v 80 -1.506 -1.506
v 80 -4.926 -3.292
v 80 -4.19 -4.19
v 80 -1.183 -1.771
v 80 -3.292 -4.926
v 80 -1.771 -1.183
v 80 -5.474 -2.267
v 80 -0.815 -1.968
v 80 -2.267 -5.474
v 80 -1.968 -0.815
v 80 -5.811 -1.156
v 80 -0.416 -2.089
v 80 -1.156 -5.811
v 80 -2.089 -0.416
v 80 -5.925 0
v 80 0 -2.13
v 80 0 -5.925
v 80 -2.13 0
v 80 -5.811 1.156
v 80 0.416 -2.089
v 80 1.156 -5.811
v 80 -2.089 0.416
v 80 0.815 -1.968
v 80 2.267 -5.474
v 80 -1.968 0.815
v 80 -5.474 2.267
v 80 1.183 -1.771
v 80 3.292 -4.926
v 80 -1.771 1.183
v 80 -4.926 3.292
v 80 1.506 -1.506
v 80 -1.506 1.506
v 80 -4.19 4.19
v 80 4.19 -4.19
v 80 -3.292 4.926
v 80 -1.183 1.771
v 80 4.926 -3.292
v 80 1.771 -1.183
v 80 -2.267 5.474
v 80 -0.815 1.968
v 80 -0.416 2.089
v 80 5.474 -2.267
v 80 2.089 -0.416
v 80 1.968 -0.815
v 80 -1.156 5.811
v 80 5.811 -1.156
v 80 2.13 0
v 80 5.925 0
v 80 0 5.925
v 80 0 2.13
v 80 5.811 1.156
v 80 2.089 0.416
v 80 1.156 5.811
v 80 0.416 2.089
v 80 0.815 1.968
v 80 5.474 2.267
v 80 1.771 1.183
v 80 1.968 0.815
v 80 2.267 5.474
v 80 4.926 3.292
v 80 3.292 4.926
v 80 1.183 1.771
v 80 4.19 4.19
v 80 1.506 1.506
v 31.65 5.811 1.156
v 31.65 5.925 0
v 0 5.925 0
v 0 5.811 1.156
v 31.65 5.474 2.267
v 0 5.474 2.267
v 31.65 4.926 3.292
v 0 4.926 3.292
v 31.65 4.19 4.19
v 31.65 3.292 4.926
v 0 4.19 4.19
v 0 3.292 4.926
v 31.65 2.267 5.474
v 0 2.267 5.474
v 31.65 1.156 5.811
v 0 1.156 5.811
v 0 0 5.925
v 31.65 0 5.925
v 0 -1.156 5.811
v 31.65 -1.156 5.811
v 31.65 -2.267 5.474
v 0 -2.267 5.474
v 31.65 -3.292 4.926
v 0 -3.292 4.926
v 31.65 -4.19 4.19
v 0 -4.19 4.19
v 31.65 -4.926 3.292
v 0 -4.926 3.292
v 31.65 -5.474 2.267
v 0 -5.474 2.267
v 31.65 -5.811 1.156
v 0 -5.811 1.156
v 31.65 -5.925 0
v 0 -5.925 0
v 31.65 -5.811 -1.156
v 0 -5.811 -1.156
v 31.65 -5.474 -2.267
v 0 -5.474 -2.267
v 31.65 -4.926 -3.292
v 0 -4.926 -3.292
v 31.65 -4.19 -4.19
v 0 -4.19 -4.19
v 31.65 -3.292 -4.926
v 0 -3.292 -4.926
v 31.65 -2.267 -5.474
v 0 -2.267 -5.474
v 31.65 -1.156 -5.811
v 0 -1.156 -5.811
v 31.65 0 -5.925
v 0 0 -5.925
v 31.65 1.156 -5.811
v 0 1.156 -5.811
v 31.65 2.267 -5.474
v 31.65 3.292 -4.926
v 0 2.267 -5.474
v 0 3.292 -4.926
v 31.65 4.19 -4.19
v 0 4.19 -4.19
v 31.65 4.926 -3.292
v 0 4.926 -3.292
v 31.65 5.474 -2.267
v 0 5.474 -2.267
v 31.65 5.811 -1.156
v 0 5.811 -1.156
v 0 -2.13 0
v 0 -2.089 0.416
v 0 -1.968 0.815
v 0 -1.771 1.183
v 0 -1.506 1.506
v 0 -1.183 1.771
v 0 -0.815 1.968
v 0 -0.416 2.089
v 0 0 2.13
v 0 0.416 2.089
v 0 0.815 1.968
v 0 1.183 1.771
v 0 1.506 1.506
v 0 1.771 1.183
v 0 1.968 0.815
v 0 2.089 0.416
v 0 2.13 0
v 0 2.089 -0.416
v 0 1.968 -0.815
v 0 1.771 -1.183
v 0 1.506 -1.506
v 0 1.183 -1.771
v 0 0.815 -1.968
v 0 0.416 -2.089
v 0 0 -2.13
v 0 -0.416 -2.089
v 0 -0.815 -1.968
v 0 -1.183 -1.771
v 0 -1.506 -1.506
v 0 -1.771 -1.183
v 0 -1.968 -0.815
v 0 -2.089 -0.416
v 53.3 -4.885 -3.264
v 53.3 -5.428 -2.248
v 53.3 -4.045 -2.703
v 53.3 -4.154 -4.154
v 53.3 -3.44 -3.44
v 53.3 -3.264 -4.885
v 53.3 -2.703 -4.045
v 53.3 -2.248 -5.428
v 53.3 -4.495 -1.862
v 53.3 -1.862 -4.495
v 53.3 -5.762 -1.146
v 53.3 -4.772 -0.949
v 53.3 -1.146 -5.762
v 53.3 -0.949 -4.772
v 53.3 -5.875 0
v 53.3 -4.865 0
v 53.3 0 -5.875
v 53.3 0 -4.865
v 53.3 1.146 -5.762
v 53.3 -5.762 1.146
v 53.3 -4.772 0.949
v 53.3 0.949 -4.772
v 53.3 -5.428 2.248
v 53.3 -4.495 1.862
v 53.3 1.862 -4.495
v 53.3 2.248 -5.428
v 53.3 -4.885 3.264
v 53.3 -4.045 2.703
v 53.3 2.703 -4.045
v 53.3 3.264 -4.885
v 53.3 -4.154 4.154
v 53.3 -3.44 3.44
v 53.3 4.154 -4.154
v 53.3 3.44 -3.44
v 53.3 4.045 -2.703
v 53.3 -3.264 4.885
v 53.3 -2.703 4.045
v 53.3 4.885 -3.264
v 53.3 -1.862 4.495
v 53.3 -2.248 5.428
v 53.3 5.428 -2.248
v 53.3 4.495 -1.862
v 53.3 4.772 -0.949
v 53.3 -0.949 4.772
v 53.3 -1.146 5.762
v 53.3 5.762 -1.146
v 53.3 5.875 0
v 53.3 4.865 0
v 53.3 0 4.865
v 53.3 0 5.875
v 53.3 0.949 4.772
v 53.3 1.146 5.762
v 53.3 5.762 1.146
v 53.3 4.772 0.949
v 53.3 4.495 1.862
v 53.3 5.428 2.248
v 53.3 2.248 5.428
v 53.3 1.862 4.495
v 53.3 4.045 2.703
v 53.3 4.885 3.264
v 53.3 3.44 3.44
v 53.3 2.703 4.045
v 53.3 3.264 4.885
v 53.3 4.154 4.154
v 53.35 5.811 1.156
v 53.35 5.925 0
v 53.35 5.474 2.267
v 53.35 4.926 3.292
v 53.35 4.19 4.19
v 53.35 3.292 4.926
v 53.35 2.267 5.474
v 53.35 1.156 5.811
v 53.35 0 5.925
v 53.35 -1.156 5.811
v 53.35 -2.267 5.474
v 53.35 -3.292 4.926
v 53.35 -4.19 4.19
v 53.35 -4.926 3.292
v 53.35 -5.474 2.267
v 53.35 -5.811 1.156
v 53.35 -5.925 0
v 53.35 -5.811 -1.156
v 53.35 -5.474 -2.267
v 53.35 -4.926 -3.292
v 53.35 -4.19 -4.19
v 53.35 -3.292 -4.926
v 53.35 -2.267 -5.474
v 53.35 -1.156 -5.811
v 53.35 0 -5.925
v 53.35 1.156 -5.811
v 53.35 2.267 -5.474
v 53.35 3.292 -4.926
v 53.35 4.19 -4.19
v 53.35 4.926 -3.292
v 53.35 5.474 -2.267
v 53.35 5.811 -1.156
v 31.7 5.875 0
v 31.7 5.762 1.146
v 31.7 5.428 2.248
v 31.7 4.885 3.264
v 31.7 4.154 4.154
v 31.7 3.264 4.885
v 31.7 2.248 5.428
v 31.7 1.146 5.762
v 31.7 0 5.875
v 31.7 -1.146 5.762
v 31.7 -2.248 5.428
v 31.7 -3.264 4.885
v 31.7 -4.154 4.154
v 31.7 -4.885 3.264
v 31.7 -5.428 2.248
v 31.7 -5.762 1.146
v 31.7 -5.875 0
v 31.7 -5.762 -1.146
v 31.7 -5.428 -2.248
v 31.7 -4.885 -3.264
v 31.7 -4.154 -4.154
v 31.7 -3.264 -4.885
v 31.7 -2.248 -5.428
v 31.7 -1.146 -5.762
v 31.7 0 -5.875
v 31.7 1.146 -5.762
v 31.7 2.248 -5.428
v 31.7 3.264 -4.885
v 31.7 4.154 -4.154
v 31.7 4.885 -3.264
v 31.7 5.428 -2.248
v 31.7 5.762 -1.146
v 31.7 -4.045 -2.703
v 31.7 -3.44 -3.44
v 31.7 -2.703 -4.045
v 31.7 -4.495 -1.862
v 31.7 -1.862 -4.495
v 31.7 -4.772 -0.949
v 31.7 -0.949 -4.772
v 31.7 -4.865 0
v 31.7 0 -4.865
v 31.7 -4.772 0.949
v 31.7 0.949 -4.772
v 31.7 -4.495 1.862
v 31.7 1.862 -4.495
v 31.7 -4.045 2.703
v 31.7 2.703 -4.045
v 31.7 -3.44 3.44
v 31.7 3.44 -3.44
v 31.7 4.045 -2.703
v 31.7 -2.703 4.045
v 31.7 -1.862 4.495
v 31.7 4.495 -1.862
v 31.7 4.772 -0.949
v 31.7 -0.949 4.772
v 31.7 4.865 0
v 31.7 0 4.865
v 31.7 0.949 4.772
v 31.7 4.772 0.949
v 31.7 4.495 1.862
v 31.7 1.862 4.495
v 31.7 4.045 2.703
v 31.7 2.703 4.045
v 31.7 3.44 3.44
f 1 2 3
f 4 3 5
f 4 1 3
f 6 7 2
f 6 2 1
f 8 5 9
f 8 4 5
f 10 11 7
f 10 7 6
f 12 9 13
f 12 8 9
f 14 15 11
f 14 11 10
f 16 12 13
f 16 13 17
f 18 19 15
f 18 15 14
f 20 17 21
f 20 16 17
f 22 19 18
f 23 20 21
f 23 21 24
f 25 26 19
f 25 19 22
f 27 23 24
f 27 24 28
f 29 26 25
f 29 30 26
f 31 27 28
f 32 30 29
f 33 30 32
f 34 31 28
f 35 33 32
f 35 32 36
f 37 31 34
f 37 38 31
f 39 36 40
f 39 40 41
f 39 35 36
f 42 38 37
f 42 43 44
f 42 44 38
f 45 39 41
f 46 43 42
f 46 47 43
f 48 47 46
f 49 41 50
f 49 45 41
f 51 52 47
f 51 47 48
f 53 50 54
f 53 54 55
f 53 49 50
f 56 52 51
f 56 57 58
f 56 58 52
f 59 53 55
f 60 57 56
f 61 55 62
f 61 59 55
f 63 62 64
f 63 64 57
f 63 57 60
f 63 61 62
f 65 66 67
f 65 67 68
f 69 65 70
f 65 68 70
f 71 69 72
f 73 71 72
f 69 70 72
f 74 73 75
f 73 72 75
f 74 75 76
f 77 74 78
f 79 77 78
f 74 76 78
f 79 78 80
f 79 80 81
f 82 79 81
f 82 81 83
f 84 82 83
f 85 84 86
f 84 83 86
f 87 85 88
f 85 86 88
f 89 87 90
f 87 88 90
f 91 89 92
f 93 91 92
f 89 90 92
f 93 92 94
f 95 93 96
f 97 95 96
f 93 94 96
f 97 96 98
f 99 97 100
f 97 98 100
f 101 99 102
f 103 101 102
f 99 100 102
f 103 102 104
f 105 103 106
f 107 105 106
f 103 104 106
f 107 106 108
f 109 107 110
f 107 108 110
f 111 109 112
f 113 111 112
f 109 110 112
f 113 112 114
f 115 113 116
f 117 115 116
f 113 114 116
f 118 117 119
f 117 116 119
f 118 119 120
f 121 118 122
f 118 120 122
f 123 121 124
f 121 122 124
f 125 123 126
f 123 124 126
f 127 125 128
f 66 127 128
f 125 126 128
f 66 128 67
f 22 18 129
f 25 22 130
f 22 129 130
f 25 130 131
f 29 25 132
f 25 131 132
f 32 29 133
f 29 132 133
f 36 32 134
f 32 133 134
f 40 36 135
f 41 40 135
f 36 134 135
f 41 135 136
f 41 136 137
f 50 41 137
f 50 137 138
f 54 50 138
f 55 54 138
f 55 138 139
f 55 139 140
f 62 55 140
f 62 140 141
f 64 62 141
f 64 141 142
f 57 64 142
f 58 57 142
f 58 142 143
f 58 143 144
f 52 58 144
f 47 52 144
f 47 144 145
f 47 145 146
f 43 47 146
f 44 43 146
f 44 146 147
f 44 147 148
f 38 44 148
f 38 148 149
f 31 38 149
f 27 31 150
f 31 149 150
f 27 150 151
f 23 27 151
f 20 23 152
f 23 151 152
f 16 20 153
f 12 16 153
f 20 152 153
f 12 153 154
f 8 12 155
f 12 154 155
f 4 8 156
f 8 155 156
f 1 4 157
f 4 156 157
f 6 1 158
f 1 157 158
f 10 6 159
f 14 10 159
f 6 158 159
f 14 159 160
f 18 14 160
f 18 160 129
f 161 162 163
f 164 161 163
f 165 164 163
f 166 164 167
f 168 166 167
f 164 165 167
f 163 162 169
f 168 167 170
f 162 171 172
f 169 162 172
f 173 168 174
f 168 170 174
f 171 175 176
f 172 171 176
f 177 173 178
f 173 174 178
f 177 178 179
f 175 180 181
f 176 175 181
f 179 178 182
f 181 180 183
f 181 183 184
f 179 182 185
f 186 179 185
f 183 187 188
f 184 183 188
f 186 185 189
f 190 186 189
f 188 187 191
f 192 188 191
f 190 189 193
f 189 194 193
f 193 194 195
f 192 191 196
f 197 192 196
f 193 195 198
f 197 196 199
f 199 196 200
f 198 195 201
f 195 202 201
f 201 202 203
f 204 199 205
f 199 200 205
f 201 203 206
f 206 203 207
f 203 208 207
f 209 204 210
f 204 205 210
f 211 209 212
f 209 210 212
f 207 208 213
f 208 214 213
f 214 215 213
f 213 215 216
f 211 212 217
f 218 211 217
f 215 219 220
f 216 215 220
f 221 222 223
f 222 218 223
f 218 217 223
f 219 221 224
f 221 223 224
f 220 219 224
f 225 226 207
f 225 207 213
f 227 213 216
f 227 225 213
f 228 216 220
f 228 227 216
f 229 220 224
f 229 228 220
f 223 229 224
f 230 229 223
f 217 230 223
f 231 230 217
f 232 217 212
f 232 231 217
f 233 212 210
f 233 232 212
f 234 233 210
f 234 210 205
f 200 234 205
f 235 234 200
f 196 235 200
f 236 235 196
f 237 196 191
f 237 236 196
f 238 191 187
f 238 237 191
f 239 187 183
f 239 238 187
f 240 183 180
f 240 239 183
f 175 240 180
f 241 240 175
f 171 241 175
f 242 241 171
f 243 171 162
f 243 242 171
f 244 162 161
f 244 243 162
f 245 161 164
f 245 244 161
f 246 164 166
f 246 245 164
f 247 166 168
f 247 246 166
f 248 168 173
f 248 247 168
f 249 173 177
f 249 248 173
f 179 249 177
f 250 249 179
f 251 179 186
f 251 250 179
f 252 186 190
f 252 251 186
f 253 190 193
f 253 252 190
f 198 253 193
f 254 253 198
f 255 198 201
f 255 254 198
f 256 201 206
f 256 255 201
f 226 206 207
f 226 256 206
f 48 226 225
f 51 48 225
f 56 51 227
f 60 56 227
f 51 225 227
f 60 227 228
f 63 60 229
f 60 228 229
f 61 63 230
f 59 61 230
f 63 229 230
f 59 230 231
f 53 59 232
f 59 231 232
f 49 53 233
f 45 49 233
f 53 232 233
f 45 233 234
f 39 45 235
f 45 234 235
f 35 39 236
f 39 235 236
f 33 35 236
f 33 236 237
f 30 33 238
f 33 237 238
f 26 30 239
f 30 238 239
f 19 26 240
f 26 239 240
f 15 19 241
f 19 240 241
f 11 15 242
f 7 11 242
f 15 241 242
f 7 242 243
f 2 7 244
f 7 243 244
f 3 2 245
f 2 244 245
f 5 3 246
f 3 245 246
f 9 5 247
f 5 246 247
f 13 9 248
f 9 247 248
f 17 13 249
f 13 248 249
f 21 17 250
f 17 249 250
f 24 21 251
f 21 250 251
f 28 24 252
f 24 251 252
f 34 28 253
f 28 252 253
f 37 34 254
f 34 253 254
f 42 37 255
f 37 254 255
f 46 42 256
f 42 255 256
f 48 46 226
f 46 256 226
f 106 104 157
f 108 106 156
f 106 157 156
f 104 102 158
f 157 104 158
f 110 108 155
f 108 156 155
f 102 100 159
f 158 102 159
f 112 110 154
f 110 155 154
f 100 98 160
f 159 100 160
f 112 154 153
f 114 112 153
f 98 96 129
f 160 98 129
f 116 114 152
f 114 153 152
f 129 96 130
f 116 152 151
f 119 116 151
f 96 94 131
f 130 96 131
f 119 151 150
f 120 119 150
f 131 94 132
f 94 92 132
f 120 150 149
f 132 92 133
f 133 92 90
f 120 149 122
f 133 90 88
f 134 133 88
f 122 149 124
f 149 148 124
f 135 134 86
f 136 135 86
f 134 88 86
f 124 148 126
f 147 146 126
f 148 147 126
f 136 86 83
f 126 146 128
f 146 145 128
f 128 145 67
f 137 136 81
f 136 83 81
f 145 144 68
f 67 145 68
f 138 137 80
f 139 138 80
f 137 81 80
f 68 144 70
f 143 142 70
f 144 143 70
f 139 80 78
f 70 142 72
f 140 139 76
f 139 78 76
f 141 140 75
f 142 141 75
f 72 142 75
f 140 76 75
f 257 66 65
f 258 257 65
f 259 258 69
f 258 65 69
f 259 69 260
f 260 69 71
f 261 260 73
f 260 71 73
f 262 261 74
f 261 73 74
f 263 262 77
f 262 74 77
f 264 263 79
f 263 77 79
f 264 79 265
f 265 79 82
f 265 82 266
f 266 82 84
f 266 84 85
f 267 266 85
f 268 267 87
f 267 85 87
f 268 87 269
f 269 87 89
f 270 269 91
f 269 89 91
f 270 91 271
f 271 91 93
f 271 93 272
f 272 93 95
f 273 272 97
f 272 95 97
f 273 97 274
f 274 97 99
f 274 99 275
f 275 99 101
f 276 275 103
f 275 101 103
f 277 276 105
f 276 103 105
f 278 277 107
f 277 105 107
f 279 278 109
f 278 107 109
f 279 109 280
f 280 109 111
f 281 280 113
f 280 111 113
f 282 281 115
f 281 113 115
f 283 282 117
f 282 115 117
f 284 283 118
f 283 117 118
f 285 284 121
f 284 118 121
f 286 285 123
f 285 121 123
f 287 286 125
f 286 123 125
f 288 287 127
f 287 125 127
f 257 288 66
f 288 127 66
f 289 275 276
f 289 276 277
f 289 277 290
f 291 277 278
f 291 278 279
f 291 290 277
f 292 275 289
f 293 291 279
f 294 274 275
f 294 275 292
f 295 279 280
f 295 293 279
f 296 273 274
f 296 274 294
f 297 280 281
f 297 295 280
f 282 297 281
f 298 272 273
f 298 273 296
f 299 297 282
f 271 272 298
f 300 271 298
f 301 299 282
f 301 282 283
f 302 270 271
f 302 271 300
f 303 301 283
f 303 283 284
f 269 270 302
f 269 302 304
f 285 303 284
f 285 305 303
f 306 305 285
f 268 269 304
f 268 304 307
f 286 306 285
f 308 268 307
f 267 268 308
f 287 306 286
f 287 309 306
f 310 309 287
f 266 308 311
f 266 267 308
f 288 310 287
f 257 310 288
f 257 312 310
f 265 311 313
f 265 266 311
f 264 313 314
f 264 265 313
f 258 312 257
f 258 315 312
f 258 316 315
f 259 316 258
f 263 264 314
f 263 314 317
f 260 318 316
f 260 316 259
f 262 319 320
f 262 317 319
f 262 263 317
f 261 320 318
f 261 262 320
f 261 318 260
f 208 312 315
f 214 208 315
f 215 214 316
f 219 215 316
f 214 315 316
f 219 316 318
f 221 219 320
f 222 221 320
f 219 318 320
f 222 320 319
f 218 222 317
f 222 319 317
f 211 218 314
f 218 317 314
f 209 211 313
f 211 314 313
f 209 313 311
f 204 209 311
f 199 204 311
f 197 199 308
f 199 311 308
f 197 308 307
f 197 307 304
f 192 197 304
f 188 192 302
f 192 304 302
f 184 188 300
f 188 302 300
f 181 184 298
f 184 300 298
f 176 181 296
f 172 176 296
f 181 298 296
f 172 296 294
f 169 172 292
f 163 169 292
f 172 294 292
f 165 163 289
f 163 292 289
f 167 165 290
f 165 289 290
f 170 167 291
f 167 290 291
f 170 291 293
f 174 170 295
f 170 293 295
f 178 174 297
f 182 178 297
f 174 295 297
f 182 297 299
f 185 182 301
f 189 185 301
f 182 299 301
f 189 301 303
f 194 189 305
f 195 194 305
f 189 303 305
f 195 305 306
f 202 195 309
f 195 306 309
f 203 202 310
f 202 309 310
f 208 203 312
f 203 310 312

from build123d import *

# Parameters (mm, degrees)
F0_R     = 5.925
F1_DEPTH = 31.7
F2_R     = 4.865
F3_DEPTH = 21.6
F4_R     = 5.925
F4_R_2   = 4.865
F5_DEPTH = 26.7
F7_D     = 4.26
F8_SIZE  = 0.05
F9_SIZE  = 0.05


with BuildPart() as f1:
    # F0 (on Right) → F1 (new body)
    with BuildSketch(Plane.YZ):
        Circle(F0_R)
    extrude(amount=F1_DEPTH)

    # F2 (on face) → F3 (join)
    with BuildSketch(Plane.YZ.offset(31.7)):
        Circle(F2_R)
    extrude(amount=F3_DEPTH)

    # F4 (on face) → F5 (join)
    with BuildSketch(Plane.YZ.offset(53.3)):
        Circle(F4_R)
        Circle(F4_R_2, mode=Mode.SUBTRACT)
        Circle(F4_R_2)
    extrude(amount=F5_DEPTH)

    # F7 (through all)
    with Locations(Plane.YZ.offset(80)):
        with Locations((0, 0)):
            Hole(F7_D / 2)

    # F8
    f8_edges = [f1.edges().sort_by_distance(p)[0] for p in [
        (31.7, -5.925, 0),
    ]]
    chamfer(f8_edges, length=F8_SIZE)

    # F9
    f9_edges = [f1.edges().sort_by_distance(p)[0] for p in [
        (53.3, -5.925, 0),
    ]]
    chamfer(f9_edges, length=F9_SIZE)


solid = f1.part
